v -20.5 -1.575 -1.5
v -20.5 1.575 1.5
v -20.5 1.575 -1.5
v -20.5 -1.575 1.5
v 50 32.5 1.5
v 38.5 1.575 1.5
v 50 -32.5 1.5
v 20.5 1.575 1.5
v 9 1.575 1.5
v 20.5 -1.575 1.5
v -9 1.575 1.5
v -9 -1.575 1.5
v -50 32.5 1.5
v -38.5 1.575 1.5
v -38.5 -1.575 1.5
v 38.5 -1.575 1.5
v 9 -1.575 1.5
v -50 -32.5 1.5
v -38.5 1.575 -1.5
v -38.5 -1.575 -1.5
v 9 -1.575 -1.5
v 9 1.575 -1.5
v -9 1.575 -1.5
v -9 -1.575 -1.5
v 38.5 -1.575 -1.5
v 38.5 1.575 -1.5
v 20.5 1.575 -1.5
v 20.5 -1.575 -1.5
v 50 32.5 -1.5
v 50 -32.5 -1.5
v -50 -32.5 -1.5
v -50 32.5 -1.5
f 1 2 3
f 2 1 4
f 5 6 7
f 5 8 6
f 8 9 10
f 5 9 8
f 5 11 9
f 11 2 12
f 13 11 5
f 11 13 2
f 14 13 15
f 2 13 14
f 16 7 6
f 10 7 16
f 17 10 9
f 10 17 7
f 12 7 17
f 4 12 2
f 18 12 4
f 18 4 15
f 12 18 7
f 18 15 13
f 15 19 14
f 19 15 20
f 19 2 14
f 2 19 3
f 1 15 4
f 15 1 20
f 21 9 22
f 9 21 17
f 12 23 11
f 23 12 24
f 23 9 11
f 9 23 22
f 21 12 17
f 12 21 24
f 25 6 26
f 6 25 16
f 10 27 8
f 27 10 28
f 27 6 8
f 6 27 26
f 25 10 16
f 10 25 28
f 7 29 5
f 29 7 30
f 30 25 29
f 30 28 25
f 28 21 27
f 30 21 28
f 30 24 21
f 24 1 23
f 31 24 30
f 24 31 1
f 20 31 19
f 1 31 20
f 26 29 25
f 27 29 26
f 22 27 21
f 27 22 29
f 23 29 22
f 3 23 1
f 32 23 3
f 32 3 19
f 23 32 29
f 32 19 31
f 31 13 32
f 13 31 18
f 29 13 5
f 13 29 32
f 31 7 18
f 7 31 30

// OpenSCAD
// MAKERBENCH-LASER2D: {"material_thickness_mm": 3.0, "kerf_mm": 0.2, "slot_count": 3, "slot_length_mm": 18.0, "slot_width_mm": 3.15, "min_web_mm": 11.5}
echo("MAKERBENCH-LASER2D: {\"material_thickness_mm\": 3.0, \"kerf_mm\": 0.2, \"slot_count\": 3, \"slot_length_mm\": 18.0, \"slot_width_mm\": 3.15, \"min_web_mm\": 11.5}");

panel_x = 100.0;
panel_y = 65.0;
thickness = 3.0;

slot_count = 3;
slot_length = 18.0;
slot_width = 3.15;
min_web = 11.5;

module slot_at(x) {
    translate([x, 0, -0.5])
        cube([slot_length, slot_width, thickness + 1.0], center = true);
}

difference() {
    cube([panel_x, panel_y, thickness], center = true);

    for (x = [-29.5, 0, 29.5])
        slot_at(x);
}
